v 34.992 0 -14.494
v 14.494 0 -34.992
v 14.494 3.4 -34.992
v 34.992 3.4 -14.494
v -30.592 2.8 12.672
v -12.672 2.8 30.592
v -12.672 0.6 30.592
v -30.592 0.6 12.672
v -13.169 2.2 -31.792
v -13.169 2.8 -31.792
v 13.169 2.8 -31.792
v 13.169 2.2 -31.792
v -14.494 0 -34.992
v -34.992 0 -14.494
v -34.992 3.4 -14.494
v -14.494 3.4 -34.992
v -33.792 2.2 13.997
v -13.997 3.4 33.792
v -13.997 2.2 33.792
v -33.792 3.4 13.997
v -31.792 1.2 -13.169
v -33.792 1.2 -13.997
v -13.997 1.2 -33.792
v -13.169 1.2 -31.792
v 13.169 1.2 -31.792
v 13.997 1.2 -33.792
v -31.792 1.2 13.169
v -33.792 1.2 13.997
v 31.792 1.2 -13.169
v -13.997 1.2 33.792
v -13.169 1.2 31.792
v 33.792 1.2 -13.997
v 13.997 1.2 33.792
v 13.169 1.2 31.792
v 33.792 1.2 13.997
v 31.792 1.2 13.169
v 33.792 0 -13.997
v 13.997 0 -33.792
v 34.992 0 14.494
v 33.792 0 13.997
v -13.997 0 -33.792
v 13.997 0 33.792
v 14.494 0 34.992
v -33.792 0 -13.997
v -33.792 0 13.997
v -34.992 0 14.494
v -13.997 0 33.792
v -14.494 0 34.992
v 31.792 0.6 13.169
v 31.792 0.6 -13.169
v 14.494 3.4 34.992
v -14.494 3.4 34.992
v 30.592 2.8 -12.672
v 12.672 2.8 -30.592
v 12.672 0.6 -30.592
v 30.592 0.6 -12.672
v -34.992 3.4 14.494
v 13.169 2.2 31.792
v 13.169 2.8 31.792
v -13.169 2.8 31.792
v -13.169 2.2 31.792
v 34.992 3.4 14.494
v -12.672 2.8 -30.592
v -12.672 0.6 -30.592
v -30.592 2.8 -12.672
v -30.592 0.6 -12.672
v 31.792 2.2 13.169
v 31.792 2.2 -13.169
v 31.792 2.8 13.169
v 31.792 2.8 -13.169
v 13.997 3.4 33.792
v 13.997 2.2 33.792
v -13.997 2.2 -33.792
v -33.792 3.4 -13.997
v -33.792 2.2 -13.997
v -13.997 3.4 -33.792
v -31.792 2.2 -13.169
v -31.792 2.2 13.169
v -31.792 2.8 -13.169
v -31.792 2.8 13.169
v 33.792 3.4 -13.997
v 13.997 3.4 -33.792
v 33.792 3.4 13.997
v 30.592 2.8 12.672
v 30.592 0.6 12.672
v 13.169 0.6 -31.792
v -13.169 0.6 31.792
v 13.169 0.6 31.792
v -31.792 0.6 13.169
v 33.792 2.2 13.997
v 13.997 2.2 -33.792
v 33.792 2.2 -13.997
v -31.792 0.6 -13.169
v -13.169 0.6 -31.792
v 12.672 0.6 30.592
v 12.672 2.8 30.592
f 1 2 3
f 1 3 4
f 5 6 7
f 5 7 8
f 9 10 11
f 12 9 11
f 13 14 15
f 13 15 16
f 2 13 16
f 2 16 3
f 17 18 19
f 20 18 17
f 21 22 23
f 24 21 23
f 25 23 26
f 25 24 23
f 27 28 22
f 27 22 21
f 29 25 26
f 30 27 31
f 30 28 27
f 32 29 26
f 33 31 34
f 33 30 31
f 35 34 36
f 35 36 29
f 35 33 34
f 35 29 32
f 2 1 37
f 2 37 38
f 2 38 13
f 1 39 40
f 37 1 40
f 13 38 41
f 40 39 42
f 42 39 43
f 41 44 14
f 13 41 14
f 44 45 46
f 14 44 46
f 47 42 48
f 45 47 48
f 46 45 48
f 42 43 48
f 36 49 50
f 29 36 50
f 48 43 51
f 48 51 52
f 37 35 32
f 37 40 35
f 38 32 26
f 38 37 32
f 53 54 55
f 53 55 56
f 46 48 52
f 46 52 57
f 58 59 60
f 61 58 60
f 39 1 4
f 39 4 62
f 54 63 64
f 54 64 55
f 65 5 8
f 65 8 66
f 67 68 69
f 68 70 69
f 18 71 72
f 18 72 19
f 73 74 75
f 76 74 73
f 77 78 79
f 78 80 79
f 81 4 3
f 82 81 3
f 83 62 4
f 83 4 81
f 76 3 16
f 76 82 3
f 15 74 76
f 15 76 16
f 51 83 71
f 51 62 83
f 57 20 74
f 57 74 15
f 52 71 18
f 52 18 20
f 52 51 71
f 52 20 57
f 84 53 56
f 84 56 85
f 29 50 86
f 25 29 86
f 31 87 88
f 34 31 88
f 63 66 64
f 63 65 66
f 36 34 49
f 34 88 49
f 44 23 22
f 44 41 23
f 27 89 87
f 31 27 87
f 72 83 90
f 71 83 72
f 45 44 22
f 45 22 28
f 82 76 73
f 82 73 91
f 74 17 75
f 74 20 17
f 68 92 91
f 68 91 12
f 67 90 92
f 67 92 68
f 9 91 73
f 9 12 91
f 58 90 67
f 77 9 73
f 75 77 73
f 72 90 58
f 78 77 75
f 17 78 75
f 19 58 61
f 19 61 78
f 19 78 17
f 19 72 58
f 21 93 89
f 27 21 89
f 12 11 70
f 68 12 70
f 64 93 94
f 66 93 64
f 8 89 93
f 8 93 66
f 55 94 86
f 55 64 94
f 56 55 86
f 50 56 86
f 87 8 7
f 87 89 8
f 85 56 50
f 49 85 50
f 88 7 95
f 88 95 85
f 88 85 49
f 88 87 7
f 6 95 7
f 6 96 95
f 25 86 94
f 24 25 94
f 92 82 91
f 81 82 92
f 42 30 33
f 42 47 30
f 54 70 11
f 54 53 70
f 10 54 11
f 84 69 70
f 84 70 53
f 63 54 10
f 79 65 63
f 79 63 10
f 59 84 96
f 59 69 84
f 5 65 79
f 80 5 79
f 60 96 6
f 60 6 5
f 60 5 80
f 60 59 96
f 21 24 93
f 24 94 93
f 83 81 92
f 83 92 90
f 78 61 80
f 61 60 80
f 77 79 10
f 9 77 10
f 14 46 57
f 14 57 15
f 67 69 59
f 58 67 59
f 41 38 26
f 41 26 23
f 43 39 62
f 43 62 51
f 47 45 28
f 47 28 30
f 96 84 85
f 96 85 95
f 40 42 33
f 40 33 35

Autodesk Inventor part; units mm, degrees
ref_plane "YZ Plane" through (0, 0, 0) normal (1, 0, 0) x (0, 1, 0)
ref_plane "XZ Plane" through (0, 0, 0) normal (0, 1, 0) x (-1, 0, 0)
sketch "스케치1" plane through (0, 0, 0) normal (0, 1, 0) x (-1, 0, 0)
  line L0 (-32.5919, 13.5) -> (-13.5, 32.5919)
  line L1 (-13.5, 32.5919) -> (13.5, 32.5919)
  line L2 (13.5, 32.5919) -> (32.5919, 13.5)
  line L3 (32.5919, 13.5) -> (32.5919, -13.5)
  line L4 (32.5919, -13.5) -> (13.5, -32.5919)
  line L5 (13.5, -32.5919) -> (-13.5, -32.5919)
  line L6 (-13.5, -32.5919) -> (-32.5919, -13.5)
  line L7 (-32.5919, -13.5) -> (-32.5919, 13.5)
  line L8 (34.9919, 14.4941) -> (34.9919, -14.4941)
  line L9 (34.9919, -14.4941) -> (14.4941, -34.9919)
  line L10 (14.4941, -34.9919) -> (-14.4941, -34.9919)
  line L11 (-14.4941, -34.9919) -> (-34.9919, -14.4941)
  line L12 (-34.9919, -14.4941) -> (-34.9919, 14.4941)
  line L13 (-34.9919, 14.4941) -> (-14.4941, 34.9919)
  line L14 (-14.4941, 34.9919) -> (14.4941, 34.9919)
  line L15 (14.4941, 34.9919) -> (34.9919, 14.4941)
  point P0 (0, 0)
  point P1 (0, 0)
  point P2 (0, 0)
  dimension "d0" = 27
  dimension "d1" = 2.4
extrude "돌출1" add sketch "스케치1" along normal blind 3.4 contours L0 L1 L2 L3 L4 L5 L6 L7 | L8 L9 L10 L11 L12 L13 L14 L15
sketch "스케치3" plane through (0, 0, 0) normal (0, -1, 0) x (1, 0, 0)
  line L0 (-13.5, 32.5919) -> (13.5, 32.5919)
  line L1 (13.5, 32.5919) -> (32.5919, 13.5)
  line L2 (32.5919, 13.5) -> (32.5919, -13.5)
  line L3 (32.5919, -13.5) -> (13.5, -32.5919)
  line L4 (13.5, -32.5919) -> (-13.5, -32.5919)
  line L5 (-13.5, -32.5919) -> (-32.5919, -13.5)
  line L6 (-32.5919, -13.5) -> (-32.5919, 13.5)
  line L7 (-32.5919, 13.5) -> (-13.5, 32.5919)
  line L8 (-13.9971, 33.7919) -> (13.9971, 33.7919)
  line L9 (13.9971, 33.7919) -> (33.7919, 13.9971)
  line L10 (33.7919, 13.9971) -> (33.7919, -13.9971)
  line L11 (33.7919, -13.9971) -> (13.9971, -33.7919)
  line L12 (13.9971, -33.7919) -> (-13.9971, -33.7919)
  line L13 (-13.9971, -33.7919) -> (-33.7919, -13.9971)
  line L14 (-33.7919, -13.9971) -> (-33.7919, 13.9971)
  line L15 (-33.7919, 13.9971) -> (-13.9971, 33.7919)
  line L16 (-13.1686, 31.7919) -> (13.1686, 31.7919)
  line L17 (13.1686, 31.7919) -> (31.7919, 13.1686)
  line L18 (31.7919, 13.1686) -> (31.7919, -13.1686)
  line L19 (31.7919, -13.1686) -> (13.1686, -31.7919)
  line L20 (13.1686, -31.7919) -> (-13.1686, -31.7919)
  line L21 (-13.1686, -31.7919) -> (-31.7919, -13.1686)
  line L22 (-31.7919, -13.1686) -> (-31.7919, 13.1686)
  line L23 (-31.7919, 13.1686) -> (-13.1686, 31.7919)
  point P0 (0, 0)
  point P1 (0, 0)
  point P2 (0, 0)
  point P3 (0, 0)
  dimension "d8" = 27
  dimension "d9" = 1.2
  dimension "d19" = 0.8
extrude "돌출3" cut sketch "스케치3" against normal blind 1.2 contours L0 L1 L2 L3 L4 L5 L6 L7 | L8 L9 L10 L11 L12 L13 L14 L15
sketch "스케치4" plane through (0, 3.4, 0) normal (0, 1, 0) x (1, 0, 0)
  line L0 (12.6716, -30.5919) -> (-12.6716, -30.5919)
  line L1 (-12.6716, -30.5919) -> (-30.5919, -12.6716)
  line L2 (-30.5919, -12.6716) -> (-30.5919, 12.6716)
  line L3 (-30.5919, 12.6716) -> (-12.6716, 30.5919)
  line L4 (-12.6716, 30.5919) -> (12.6716, 30.5919)
  line L5 (12.6716, 30.5919) -> (30.5919, 12.6716)
  line L6 (30.5919, 12.6716) -> (30.5919, -12.6716)
  line L7 (30.5919, -12.6716) -> (12.6716, -30.5919)
  line L8 (-31.7919, -13.1686) -> (-31.7919, 13.1686) projected
  point P0 (0, 0)
  point P1 (0, 0)
  dimension "d21" = 1.2
extrude "돌출4" cut sketch "스케치4" against normal blind 5
ref_plane "작업 평면1" through (0, 1.7, 0) normal (0, 1, 0) x (1, 0, 0)
sketch "스케치6" plane through (0, 0, 0) normal (0, -1, 0) x (1, 0, 0)
  line L0 (30.5919, -12.6716) -> (12.6716, -30.5919) projected
  line L1 (12.6716, -30.5919) -> (-12.6716, -30.5919) projected
  line L2 (-12.6716, -30.5919) -> (-30.5919, -12.6716) projected
  line L3 (-30.5919, -12.6716) -> (-30.5919, 12.6716) projected
  line L4 (-30.5919, 12.6716) -> (-12.6716, 30.5919) projected
  line L5 (-12.6716, 30.5919) -> (12.6716, 30.5919) projected
  line L6 (12.6716, 30.5919) -> (30.5919, 12.6716) projected
  line L7 (30.5919, 12.6716) -> (30.5919, -12.6716) projected
  line L8 (31.7919, 13.1686) -> (13.1686, 31.7919) projected
  line L9 (13.1686, 31.7919) -> (-13.1686, 31.7919) projected
  line L10 (-13.1686, 31.7919) -> (-31.7919, 13.1686) projected
  line L11 (-31.7919, 13.1686) -> (-31.7919, -13.1686) projected
  line L12 (-31.7919, -13.1686) -> (-13.1686, -31.7919) projected
  line L13 (-13.1686, -31.7919) -> (13.1686, -31.7919) projected
  line L14 (13.1686, -31.7919) -> (31.7919, -13.1686) projected
  line L15 (31.7919, -13.1686) -> (31.7919, 13.1686) projected
  point P0 (0, 0)
extrude "돌출7" cut sketch "스케치6" against normal blind 0.6
mirror "미러2" about plane through (0, 1.7, 0) normal (0, 1, 0) of "돌출7", "돌출3"
properties part number "팔각형 OV-PAM 5패턴 링 - 틈 너비 수정"
